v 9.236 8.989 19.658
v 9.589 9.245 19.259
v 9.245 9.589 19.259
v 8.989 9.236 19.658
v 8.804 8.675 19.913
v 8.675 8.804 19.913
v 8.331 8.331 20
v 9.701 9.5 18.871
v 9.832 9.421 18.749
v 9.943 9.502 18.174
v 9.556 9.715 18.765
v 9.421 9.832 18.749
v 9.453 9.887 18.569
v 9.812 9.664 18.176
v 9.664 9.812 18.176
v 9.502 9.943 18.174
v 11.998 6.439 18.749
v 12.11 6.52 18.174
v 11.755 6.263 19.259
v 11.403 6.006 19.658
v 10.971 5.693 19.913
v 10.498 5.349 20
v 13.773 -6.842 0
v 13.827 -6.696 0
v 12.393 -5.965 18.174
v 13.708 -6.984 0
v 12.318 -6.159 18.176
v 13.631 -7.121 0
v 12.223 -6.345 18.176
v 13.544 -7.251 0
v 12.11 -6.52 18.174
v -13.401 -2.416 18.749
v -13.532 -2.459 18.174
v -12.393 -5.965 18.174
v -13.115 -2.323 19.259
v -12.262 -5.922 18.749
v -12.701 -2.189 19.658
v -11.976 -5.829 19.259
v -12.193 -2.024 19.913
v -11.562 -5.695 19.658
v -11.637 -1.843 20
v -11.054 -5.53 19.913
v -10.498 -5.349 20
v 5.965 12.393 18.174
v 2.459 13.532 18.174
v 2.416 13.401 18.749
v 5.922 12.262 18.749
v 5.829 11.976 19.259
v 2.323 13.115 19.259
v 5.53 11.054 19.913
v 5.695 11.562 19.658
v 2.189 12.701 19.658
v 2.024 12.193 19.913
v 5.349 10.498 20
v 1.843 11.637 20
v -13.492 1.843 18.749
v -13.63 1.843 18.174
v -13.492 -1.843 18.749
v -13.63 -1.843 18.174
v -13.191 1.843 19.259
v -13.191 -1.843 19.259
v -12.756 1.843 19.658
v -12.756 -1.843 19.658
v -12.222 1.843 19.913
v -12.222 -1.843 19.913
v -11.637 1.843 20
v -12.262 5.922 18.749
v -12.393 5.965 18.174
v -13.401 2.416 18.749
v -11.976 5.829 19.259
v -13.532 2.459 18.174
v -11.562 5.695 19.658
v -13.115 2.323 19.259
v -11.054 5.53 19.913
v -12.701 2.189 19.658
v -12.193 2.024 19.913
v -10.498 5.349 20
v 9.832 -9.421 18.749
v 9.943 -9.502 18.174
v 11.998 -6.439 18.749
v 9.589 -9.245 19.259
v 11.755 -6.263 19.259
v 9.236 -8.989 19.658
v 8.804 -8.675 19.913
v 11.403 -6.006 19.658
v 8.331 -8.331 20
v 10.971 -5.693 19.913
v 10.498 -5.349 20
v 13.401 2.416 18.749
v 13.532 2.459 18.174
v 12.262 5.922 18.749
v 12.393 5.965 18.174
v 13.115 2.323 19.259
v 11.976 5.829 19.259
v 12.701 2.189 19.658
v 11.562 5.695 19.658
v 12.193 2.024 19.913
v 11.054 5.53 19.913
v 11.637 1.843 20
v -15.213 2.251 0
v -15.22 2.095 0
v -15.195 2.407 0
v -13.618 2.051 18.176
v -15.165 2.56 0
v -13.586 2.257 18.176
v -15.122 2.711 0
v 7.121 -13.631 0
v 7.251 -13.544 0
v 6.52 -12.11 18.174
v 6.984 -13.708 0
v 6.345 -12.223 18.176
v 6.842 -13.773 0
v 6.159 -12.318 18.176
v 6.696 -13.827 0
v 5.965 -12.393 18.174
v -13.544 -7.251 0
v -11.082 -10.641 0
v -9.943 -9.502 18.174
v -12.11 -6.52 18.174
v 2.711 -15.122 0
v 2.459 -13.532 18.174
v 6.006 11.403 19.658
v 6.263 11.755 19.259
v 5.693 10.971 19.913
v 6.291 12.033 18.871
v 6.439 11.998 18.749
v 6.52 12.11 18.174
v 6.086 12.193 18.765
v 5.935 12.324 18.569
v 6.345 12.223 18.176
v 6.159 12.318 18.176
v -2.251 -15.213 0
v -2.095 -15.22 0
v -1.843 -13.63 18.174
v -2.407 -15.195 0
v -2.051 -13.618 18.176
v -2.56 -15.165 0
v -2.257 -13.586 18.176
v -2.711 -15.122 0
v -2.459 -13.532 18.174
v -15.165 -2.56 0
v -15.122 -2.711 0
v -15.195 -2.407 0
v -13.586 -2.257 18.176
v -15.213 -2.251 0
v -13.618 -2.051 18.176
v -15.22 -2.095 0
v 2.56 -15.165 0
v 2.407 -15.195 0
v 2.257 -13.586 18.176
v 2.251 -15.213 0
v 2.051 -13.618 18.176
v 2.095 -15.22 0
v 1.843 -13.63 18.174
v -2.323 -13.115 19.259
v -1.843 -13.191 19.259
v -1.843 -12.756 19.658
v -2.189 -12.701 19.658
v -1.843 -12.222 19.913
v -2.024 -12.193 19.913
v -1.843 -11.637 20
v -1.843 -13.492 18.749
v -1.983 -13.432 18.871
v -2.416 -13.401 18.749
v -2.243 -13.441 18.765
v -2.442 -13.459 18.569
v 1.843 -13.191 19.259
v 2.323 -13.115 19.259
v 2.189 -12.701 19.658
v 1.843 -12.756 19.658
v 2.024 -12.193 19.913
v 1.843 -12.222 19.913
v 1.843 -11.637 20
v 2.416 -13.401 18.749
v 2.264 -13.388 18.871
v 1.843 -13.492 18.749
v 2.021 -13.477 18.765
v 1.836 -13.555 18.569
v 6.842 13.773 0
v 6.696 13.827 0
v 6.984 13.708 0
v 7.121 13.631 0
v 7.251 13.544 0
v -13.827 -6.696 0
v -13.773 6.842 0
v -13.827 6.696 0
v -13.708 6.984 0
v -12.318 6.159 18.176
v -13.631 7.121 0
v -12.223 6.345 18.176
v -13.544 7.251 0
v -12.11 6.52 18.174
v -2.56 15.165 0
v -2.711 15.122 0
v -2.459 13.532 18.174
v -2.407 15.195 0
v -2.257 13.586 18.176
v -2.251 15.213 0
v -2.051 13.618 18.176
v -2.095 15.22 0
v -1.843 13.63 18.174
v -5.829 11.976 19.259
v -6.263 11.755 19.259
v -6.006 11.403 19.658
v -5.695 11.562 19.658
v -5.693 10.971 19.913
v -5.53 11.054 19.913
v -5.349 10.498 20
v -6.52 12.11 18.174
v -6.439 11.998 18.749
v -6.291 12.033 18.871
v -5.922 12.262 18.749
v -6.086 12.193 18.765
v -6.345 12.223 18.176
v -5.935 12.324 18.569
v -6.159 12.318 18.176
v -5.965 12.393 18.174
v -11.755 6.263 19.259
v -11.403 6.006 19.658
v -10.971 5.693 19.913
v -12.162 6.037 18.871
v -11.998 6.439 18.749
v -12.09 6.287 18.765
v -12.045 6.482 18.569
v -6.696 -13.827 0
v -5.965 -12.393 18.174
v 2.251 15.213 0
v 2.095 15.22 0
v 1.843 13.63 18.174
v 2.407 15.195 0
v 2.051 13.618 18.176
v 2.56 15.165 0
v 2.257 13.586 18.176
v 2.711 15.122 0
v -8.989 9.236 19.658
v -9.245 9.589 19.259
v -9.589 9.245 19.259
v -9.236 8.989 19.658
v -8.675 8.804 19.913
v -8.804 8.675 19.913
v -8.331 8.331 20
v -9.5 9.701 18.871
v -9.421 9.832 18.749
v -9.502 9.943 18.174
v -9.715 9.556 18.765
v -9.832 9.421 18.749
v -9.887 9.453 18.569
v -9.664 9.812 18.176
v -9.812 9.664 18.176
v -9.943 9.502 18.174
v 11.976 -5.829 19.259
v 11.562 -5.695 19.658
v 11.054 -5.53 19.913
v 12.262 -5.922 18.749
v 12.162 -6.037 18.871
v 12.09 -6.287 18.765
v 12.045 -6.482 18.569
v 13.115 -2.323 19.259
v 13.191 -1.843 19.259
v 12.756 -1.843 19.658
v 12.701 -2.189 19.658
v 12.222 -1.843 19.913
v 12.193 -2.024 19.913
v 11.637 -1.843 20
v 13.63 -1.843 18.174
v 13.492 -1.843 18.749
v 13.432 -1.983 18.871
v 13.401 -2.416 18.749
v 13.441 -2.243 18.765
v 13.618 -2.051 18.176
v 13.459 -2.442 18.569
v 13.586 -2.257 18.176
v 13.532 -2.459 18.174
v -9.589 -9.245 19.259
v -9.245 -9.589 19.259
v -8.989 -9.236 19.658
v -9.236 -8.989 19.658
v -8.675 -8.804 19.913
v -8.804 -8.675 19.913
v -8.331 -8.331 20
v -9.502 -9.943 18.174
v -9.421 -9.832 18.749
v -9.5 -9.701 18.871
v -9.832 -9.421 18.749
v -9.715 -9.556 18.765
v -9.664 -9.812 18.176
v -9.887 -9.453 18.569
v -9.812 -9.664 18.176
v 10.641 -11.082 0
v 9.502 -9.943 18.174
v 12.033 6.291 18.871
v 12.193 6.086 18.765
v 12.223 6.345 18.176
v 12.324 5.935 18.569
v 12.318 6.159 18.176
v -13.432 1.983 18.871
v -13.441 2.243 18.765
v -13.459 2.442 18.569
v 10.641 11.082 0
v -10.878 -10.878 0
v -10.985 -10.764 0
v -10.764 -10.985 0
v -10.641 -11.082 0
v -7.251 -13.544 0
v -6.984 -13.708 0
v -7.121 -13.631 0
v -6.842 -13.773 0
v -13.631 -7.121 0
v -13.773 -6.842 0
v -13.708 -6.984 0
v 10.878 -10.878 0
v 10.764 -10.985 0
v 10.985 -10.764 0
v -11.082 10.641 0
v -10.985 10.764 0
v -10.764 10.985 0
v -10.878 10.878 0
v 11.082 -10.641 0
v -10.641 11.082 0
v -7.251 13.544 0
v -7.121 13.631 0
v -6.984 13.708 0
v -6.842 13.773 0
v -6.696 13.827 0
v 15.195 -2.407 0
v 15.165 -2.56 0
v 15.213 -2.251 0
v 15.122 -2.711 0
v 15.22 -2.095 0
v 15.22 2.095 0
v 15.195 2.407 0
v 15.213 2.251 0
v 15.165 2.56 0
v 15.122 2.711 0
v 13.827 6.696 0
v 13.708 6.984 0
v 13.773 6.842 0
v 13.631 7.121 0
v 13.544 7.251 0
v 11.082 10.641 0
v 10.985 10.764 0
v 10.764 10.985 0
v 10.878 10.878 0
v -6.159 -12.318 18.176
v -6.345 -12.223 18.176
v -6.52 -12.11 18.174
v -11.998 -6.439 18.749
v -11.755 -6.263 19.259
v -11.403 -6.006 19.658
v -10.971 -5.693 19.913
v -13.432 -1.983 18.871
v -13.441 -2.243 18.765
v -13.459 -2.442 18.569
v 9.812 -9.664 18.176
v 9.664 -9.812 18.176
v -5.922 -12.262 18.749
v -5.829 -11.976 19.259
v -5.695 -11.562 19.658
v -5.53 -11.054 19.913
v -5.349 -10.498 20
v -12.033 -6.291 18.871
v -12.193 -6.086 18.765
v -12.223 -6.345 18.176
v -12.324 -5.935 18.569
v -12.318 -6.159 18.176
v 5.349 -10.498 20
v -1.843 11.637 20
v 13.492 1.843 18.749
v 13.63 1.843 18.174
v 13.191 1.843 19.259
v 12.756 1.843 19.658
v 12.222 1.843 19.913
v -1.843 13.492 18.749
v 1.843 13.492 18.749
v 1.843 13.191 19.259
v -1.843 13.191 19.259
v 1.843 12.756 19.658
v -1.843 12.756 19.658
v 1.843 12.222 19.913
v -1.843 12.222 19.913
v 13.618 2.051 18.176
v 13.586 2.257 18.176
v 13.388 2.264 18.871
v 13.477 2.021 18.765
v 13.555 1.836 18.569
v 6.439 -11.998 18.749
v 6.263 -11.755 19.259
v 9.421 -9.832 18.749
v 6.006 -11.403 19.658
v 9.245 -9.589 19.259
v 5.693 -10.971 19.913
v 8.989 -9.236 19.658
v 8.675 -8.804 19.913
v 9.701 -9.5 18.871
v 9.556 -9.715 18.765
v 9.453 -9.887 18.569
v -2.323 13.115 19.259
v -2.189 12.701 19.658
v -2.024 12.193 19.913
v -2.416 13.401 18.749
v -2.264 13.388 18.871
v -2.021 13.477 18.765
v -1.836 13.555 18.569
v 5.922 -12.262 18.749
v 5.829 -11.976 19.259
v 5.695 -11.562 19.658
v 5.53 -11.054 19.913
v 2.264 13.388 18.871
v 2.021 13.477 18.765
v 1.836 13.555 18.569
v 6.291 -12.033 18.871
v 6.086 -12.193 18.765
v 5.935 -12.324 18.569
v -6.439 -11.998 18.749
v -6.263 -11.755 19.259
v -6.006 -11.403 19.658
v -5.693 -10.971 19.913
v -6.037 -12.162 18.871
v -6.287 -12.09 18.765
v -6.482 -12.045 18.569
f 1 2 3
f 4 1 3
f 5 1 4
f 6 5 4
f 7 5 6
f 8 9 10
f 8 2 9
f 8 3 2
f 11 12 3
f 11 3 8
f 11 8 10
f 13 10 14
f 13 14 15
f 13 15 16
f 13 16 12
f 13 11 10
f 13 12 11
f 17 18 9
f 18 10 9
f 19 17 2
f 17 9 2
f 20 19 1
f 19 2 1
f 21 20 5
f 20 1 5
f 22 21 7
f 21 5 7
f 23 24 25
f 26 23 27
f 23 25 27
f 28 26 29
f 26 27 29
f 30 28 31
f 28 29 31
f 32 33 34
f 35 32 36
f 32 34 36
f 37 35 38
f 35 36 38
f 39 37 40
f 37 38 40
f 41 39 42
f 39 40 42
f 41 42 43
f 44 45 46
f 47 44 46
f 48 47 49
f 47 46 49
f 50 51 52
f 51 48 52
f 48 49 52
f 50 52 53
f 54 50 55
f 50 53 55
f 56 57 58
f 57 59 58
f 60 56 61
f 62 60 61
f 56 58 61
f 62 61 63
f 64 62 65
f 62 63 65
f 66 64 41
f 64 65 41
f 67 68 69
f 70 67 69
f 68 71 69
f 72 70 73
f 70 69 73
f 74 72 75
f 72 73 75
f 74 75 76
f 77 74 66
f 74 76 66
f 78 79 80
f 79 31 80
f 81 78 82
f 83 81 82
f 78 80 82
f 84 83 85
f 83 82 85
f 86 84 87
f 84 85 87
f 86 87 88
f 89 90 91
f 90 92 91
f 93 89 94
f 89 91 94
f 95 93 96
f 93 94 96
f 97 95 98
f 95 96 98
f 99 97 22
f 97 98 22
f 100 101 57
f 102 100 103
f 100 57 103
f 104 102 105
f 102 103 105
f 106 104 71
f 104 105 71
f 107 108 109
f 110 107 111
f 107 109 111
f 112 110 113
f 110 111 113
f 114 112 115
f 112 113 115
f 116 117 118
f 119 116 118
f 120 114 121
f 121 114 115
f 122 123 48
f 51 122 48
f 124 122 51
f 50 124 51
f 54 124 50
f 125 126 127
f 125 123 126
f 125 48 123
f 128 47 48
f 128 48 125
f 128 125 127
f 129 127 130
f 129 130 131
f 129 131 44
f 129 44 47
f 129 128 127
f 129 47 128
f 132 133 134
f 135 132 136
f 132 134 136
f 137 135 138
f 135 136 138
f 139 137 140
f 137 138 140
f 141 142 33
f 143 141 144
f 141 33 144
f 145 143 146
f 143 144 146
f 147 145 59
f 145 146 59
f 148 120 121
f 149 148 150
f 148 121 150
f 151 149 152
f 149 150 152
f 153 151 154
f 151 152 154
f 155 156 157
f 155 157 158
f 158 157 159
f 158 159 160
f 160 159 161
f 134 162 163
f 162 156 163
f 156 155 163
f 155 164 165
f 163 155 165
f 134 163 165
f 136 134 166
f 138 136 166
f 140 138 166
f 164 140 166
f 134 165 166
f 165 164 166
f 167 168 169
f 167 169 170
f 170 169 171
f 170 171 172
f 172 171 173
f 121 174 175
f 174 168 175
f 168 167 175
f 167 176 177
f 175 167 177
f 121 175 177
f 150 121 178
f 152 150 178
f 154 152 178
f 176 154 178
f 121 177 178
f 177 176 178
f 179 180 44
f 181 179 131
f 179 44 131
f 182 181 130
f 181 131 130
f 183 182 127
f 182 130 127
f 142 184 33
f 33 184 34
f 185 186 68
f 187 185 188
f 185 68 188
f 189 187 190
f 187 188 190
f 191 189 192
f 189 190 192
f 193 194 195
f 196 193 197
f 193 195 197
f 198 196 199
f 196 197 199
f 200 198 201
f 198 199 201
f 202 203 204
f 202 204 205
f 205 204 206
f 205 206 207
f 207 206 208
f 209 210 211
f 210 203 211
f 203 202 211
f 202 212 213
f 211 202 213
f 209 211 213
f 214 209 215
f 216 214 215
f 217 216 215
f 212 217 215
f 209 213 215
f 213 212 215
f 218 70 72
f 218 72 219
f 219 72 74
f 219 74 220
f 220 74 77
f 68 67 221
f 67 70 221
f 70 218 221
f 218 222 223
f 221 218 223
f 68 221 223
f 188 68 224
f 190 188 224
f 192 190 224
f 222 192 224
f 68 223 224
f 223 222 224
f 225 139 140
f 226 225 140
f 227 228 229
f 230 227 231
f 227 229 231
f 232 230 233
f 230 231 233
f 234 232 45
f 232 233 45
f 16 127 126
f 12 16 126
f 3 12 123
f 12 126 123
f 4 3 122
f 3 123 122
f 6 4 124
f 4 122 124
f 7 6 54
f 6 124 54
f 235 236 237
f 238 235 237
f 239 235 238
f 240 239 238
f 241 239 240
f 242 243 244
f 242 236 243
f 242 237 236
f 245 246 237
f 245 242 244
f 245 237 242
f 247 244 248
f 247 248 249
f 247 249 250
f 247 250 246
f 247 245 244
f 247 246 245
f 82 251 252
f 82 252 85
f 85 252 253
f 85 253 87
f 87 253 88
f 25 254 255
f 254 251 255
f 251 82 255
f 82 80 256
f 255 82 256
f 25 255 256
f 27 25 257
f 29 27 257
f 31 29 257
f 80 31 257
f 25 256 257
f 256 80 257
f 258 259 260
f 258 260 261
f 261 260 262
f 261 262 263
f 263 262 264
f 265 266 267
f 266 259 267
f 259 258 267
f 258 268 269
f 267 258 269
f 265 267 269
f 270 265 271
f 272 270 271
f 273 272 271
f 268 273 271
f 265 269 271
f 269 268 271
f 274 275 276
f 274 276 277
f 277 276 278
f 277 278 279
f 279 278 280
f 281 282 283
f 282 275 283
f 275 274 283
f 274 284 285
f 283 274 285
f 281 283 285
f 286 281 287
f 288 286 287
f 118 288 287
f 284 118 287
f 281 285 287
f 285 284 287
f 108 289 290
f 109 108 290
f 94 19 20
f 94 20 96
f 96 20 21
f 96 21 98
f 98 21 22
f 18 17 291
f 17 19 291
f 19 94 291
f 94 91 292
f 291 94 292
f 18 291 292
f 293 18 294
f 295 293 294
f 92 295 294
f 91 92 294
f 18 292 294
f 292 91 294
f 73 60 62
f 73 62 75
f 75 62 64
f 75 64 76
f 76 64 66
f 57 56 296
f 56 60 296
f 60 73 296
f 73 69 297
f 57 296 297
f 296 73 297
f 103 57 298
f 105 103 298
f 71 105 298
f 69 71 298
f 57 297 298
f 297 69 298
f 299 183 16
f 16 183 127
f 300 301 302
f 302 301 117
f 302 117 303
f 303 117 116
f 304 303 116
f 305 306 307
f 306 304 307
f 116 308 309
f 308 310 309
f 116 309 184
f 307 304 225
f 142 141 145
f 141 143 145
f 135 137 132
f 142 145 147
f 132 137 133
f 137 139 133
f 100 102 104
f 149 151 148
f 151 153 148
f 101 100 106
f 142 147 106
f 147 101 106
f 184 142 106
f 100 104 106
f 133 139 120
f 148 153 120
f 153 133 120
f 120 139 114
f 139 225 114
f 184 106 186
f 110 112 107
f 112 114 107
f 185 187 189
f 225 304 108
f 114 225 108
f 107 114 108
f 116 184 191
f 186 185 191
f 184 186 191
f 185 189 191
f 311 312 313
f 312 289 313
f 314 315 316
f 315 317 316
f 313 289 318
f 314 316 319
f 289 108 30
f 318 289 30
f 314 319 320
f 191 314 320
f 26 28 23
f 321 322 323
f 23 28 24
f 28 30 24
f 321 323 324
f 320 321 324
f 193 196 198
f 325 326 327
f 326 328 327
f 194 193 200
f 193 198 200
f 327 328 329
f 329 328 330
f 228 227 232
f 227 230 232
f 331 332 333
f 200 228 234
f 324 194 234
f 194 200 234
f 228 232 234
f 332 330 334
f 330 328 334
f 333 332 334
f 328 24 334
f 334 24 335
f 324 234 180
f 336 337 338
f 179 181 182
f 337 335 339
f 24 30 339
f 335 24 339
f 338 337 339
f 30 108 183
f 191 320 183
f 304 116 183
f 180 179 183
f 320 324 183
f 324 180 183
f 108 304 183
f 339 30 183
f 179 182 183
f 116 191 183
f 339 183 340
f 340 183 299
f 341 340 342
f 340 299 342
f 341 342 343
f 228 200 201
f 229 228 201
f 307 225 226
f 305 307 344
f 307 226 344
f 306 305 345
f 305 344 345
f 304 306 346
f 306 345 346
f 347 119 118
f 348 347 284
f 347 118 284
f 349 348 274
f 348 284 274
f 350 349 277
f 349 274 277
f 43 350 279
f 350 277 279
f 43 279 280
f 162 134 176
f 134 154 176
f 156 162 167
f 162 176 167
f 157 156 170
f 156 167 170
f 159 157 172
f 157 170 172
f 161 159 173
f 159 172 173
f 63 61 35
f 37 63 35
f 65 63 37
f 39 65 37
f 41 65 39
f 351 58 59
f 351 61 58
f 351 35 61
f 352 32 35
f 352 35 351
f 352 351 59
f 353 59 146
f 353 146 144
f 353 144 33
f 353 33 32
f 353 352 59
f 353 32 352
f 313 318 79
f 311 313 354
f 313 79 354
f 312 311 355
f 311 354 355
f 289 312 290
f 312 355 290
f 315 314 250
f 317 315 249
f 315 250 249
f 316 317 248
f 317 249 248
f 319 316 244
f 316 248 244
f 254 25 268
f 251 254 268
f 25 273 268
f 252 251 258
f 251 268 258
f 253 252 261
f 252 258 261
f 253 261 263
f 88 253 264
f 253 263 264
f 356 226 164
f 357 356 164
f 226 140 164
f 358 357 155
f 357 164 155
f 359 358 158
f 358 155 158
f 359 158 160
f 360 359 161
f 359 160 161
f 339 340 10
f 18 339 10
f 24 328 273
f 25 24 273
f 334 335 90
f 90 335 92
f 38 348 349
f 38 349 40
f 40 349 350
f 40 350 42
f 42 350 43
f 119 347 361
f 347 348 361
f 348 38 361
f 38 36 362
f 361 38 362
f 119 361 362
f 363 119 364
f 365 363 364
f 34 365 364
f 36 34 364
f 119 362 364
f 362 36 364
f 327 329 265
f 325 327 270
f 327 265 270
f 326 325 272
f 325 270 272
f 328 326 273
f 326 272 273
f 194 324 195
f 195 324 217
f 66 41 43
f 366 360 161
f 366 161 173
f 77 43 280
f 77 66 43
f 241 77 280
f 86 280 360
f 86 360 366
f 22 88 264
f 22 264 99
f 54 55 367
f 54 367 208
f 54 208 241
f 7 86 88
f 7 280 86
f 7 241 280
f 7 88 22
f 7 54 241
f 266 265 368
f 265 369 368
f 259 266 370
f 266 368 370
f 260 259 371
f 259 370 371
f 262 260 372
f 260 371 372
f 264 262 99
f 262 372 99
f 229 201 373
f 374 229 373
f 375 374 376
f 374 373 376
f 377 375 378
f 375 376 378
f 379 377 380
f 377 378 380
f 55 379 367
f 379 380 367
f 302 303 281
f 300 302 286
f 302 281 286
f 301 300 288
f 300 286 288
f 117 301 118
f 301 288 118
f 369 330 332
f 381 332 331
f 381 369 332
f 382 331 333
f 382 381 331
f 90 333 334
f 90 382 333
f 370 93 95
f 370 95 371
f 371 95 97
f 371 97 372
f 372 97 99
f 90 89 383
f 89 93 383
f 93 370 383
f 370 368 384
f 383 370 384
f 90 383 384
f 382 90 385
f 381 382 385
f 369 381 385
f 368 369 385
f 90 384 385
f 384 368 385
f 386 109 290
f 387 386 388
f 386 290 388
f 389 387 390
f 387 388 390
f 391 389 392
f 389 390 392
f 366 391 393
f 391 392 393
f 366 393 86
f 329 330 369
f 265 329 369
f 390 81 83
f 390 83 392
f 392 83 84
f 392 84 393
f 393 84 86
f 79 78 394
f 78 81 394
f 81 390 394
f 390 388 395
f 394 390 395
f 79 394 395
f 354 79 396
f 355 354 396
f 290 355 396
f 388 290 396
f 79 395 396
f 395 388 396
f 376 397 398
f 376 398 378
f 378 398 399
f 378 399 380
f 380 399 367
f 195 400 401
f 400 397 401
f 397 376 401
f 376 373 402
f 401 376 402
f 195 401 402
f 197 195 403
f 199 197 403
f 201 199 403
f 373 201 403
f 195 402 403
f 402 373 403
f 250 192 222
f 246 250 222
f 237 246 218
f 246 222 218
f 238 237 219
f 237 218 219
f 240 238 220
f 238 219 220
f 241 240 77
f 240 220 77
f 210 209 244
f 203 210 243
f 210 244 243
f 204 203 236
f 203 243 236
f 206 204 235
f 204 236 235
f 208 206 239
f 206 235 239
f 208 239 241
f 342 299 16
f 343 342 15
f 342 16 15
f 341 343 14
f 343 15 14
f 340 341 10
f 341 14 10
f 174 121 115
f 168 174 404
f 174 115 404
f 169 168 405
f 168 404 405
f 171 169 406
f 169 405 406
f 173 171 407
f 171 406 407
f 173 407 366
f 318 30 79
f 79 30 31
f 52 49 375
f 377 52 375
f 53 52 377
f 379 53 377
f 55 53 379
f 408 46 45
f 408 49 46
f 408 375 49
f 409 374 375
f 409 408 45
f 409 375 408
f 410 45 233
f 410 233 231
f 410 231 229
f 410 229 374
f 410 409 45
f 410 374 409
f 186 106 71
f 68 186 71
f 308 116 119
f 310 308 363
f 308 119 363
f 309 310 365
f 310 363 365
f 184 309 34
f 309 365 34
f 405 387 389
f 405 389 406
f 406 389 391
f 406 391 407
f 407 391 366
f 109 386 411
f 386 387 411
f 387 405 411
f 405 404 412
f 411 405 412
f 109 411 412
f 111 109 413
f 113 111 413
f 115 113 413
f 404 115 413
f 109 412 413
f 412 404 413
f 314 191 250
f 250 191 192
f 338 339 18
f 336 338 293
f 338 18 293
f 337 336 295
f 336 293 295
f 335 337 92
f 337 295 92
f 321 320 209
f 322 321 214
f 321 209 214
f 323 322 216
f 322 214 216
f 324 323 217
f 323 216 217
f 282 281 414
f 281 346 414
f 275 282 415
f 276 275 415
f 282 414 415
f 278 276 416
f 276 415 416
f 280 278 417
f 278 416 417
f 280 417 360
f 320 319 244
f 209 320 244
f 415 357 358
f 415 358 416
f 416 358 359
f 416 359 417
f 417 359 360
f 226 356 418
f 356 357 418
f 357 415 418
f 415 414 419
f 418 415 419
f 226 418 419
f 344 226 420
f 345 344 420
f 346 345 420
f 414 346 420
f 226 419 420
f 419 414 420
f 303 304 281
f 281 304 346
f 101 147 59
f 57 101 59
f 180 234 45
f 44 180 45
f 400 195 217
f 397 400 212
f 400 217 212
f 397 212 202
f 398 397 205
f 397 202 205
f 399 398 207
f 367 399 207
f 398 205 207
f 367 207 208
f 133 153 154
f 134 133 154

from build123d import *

# Parameters (mm, degrees)
F1_DEPTH = 20
F1_TAPER = 5
F2_R     = 2


with BuildPart() as f1:
    # F0 (on Top) → F1 (new body)
    with BuildSketch(Plane.XY):
        Polygon((15.2196083218, -2.410549146), (15.2196083218, 2.410549146), (13.729807018, 6.9956860923), (10.8960365421, 10.8960365421), (6.9956860923, 13.729807018), (2.410549146, 15.2196083218), (-2.410549146, 15.2196083218), (-6.9956860923, 13.729807018), (-10.8960365421, 10.8960365421), (-13.729807018, 6.9956860923), (-15.2196083218, 2.410549146), (-15.2196083218, -2.410549146), (-13.729807018, -6.9956860923), (-10.8960365421, -10.8960365421), (-6.9956860923, -13.729807018), (-2.410549146, -15.2196083218), (2.410549146, -15.2196083218), (6.9956860923, -13.729807018), (10.8960365421, -10.8960365421), (13.729807018, -6.9956860923), align=None)
    extrude(amount=F1_DEPTH, taper=F1_TAPER)

    # F2
    f2_edges = [f1.edges().sort_by_distance(p)[0] for p in [
        (0, 13.469835, 20),
        (4.162408, 12.810574, 20),
        (7.91737, 10.897325, 20),
        (-10.897325, 7.91737, 20),
        (-12.810574, -4.162408, 20),
        (-10.897325, -7.91737, 20),
        (-7.91737, -10.897325, 20),
        (-4.162408, -12.810574, 20),
        (0, -13.469835, 20),
        (4.162408, -12.810574, 20),
        (7.91737, -10.897325, 20),
        (10.897325, -7.91737, 20),
        (12.810574, -4.162408, 20),
        (13.469835, 0, 20),
        (12.810574, 4.162408, 20),
        (10.897325, 7.91737, 20),
        (-4.162408, 12.810574, 20),
        (-7.91737, 10.897325, 20),
        (-12.810574, 4.162408, 20),
        (-13.469835, 0, 20),
        (2.271981, 14.344722, 10),
        (-2.271981, 14.344722, 10),
        (-6.593545, 12.94056, 10),
        (-10.269687, 10.269687, 10),
        (-12.94056, 6.593545, 10),
        (-14.344722, 2.271981, 10),
        (-14.344722, -2.271981, 10),
        (-12.94056, -6.593545, 10),
        (-10.269687, -10.269687, 10),
        (-6.593545, -12.94056, 10),
        (-2.271981, -14.344722, 10),
        (2.271981, -14.344722, 10),
        (6.593545, -12.94056, 10),
        (10.269687, -10.269687, 10),
        (12.94056, 6.593545, 10),
        (6.593545, 12.94056, 10),
        (10.269687, 10.269687, 10),
        (14.344722, 2.271981, 10),
        (14.344722, -2.271981, 10),
        (12.94056, -6.593545, 10),
    ]]
    fillet(f2_edges, radius=F2_R)


solid = f1.part
